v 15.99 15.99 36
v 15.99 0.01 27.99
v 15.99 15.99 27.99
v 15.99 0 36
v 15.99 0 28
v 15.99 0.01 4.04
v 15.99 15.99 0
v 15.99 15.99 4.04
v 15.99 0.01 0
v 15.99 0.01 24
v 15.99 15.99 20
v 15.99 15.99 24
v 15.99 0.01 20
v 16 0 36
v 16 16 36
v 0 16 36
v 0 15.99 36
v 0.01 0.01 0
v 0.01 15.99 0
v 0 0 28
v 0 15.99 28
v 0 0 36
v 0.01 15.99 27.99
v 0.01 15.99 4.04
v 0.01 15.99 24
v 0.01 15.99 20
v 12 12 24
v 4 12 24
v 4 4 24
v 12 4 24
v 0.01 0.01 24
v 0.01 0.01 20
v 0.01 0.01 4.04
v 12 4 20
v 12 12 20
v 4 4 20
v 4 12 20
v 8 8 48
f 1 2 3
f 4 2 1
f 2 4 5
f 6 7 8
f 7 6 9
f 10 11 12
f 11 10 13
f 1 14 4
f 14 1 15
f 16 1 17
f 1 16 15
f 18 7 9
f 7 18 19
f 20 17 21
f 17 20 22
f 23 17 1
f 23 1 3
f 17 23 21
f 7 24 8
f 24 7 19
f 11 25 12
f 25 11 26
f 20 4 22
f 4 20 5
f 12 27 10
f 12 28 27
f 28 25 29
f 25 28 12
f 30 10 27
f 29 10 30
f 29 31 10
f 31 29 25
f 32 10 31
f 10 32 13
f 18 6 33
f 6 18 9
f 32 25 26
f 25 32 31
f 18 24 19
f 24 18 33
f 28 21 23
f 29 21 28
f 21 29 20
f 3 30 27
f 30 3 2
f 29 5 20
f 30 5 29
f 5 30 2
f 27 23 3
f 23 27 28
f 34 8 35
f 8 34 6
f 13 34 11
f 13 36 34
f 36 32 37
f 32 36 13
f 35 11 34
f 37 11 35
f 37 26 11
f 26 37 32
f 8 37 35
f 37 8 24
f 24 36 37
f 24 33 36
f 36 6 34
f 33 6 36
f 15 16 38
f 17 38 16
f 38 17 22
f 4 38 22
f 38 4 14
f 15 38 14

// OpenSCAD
difference () {
cube([15.99,15.99,36]);

//clean up
translate([0,0,0])
	cube([15.99,.01, 24]);
translate([0,16,0])
	cube([15.99,.01, 24]);
translate([0,0,0])
	cube([.01,15.99, 24]);
translate([16,0,0])
	cube([.01,15.99, 24]);
//Creation of the top cut
translate([0,16,24])
	rotate([90,0,0])
	linear_extrude(height =16, center = false, convexity = 10, twist = 0)
	polygon([[0,0],[4,0],[0,4]],[[0,1,2]]);
translate([16,0,24])
	rotate([90,0,180])
	linear_extrude(height =16, center = false, convexity = 10, twist = 0)
	polygon([[0,0],[4,0],[0,4]],[[0,1,2]]);
translate([0,0,24])
	rotate([90,0,90])
	linear_extrude(height =16, center = false, convexity = 10, twist = 0)
	polygon([[0,0],[4,0],[0,4]],[[0,1,2]]);
translate([16,16,24])
	rotate([90,0,270])
	linear_extrude(height =16, center = false, convexity = 10, twist = 0)
	polygon([[0,0],[4,0],[0,4]],[[0,1,2]]);


//Creation of the bottom Cut
translate([16,16,20])
	rotate([90,180,0])
	linear_extrude(height =16, center = false, convexity = 10, twist = 0)
	polygon([[0,16],[0,0],[4,0]],[[0,1,2]]);
translate([0,16,20])
	rotate([90,180,90])
	linear_extrude(height =16, center = false, convexity = 10, twist = 0)
	polygon([[0,16],[0,0],[4,0]],[[0,1,2]]);
translate([0,0,20])
	rotate([90,180,180])
	linear_extrude(height =16, center = false, convexity = 10, twist = 0)
	polygon([[0,16],[0,0],[4,0]],[[0,1,2]]);
translate([16,0,20])
	rotate([90,180,270])
	linear_extrude(height =16, center = false, convexity = 10, twist = 0)
	polygon([[0,16],[0,0],[4,0]],[[0,1,2]]);	
}


//Bishop Crown
polyhedron(
  points=[ [16,16,36],[0,16,36],[0,0,36],[16,0,36], // the four points at base
           [8,8,48]  ],                                 // the apex point 
  faces=[ [0,1,4],[1,2,4],[2,3,4],[3,0,4],              // each triangle side
              [1,0,3],[2,1,3] ]                         // two triangles for square base
 );
